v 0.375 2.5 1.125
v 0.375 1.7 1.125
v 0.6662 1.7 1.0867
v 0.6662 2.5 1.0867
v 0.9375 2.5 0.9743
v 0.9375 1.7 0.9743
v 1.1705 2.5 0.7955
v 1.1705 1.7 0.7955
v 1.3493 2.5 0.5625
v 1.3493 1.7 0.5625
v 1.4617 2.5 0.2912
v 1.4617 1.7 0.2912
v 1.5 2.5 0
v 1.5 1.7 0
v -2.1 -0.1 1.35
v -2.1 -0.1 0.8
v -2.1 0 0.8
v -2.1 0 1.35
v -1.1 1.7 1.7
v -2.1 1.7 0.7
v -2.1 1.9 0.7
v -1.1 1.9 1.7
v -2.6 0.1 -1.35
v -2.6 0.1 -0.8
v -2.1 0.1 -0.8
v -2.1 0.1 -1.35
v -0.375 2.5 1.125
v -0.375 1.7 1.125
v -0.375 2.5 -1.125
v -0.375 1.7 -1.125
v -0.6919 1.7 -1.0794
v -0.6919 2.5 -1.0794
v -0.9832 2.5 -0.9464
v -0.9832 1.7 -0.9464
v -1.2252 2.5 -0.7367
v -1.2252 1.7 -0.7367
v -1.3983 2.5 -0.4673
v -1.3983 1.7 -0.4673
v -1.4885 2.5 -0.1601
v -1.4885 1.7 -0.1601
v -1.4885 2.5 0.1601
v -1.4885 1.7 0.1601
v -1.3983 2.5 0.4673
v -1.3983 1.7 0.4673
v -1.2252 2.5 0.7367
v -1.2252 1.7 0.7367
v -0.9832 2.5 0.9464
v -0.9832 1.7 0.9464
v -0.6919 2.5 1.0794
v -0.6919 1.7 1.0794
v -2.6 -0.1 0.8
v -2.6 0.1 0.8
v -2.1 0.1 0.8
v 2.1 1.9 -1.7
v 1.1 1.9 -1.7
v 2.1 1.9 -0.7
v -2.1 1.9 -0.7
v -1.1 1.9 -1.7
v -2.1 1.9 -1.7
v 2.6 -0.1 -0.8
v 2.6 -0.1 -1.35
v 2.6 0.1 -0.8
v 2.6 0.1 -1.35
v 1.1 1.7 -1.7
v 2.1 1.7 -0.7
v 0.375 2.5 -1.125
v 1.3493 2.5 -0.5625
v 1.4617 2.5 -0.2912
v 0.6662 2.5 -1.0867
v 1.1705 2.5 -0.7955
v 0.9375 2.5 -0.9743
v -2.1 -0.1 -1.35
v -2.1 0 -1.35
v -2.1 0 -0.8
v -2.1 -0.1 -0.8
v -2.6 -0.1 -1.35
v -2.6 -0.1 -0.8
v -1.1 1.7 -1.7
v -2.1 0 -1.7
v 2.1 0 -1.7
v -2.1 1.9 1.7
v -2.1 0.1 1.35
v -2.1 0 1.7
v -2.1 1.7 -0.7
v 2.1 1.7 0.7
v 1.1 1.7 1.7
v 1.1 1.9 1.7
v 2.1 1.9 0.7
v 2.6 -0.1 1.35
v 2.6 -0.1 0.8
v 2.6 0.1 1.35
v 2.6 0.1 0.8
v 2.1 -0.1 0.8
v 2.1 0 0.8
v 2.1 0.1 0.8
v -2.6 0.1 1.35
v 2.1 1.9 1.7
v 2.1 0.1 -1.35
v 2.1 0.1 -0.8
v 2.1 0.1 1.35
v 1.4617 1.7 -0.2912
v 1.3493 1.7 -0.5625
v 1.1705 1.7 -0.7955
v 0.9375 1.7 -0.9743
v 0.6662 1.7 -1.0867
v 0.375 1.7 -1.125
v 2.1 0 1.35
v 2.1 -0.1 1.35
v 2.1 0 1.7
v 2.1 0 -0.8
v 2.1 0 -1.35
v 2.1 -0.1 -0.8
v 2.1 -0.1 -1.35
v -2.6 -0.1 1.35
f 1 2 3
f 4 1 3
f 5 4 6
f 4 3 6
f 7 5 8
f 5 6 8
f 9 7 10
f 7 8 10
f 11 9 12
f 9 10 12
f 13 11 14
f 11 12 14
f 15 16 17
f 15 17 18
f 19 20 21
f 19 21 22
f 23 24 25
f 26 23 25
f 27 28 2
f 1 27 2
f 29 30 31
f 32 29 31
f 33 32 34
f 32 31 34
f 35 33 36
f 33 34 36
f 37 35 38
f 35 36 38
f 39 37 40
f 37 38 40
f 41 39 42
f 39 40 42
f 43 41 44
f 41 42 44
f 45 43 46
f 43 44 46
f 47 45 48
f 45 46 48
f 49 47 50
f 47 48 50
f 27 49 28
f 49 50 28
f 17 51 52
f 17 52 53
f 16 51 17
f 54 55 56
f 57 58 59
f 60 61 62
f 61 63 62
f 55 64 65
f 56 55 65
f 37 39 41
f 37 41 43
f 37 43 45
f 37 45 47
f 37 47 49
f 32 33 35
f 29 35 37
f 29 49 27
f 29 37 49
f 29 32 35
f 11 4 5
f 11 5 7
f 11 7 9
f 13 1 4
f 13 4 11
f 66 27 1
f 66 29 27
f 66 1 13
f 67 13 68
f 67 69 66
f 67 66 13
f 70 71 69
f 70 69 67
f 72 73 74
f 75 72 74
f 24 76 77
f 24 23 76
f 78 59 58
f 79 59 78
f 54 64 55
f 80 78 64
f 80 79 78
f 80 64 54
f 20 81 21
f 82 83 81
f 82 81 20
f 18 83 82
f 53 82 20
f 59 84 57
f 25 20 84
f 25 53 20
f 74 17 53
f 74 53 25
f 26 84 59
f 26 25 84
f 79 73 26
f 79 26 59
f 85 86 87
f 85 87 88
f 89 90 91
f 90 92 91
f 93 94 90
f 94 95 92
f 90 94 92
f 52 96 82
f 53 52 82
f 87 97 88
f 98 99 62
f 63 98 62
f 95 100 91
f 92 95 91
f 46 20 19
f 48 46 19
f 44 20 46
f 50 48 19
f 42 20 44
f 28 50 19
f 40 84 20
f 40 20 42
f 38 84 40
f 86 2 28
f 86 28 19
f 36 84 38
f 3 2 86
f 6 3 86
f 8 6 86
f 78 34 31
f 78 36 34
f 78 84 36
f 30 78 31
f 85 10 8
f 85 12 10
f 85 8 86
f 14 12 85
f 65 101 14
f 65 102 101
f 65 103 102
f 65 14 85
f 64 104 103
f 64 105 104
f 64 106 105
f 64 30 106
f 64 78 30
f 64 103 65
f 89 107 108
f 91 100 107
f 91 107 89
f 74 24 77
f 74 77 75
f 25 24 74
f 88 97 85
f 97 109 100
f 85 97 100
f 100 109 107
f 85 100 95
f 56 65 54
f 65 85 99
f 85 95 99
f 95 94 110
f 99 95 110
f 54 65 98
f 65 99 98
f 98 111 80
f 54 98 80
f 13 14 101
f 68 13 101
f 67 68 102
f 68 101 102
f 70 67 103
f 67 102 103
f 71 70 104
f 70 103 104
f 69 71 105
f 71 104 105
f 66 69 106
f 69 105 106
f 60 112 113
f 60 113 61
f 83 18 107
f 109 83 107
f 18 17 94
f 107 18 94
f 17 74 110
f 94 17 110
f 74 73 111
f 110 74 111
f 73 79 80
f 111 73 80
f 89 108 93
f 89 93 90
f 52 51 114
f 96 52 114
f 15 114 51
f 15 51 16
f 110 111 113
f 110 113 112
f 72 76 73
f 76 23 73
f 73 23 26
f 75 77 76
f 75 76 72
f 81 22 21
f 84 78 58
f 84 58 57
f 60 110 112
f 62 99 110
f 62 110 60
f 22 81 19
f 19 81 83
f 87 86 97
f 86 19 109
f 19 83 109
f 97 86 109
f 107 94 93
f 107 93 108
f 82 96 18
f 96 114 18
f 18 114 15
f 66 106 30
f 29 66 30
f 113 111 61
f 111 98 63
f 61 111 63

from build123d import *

# Parameters (mm, degrees)
SKETCH1_W           = 4.2
SKETCH1_H           = 3.4
BOSS_EXTRUDE1_DEPTH = 1.7
SKETCH2_W           = 0.5
SKETCH2_H           = 0.55
BOSS_EXTRUDE2_DEPTH = 0.1
BOSS_EXTRUDE3_DEPTH = 0.2
BOSS_EXTRUDE4_DEPTH = 0.8


with BuildPart() as part:
    # Sketch1 → Boss-Extrude1 (new body)
    with BuildSketch(Plane(origin=(0, 0, 0), x_dir=(1, 0, 0), z_dir=(0, 1, 0))):
        Rectangle(SKETCH1_W, SKETCH1_H)
    extrude(amount=BOSS_EXTRUDE1_DEPTH)

    # Sketch2 → Boss-Extrude2 (add, symmetric)
    with BuildSketch(Plane.XZ):
        with Locations((2.35, 1.075)):
            Rectangle(SKETCH2_W, SKETCH2_H)
        with Locations((2.35, -1.075)):
            Rectangle(SKETCH2_W, SKETCH2_H)
        with Locations((-2.35, -1.075)):
            Rectangle(SKETCH2_W, SKETCH2_H)
        with Locations((-2.35, 1.075)):
            Rectangle(SKETCH2_W, SKETCH2_H)
    extrude(amount=BOSS_EXTRUDE2_DEPTH, both=True)

    # Sketch3 → Boss-Extrude3 (add)
    with BuildSketch(Plane(origin=(0, 1.7, 0), x_dir=(1, 0, 0), z_dir=(0, 1, 0))):
        Polygon((-2.1, 1.7), (-1.1, 1.7), (-2.1, 0.7), align=None)
        Polygon((1.1, 1.7), (2.1, 0.7), (2.1, 1.7), align=None)
        Polygon((-2.1, -0.7), (-1.1, -1.7), (-2.1, -1.7), align=None)
        Polygon((1.1, -1.7), (2.1, -0.7), (2.1, -1.7), align=None)
    extrude(amount=BOSS_EXTRUDE3_DEPTH)

    # Sketch4 → Boss-Extrude4 (add)
    with BuildSketch(Plane(origin=(0, 1.7, 0), x_dir=(1, 0, 0), z_dir=(0, 1, 0))):
        with BuildLine():
            Line((0.375, 1.125), (-0.375, 1.125))
            ThreePointArc((-0.375, 1.125), (-0.184760274, 1.10879838), (0, 1.060660172))
            ThreePointArc((0, 1.060660172), (0.184760274, 1.10879838), (0.375, 1.125))
        make_face()
        with BuildLine():
            ThreePointArc((0, -1.060660172), (-0.184760274, -1.10879838), (-0.375, -1.125))
            Line((-0.375, -1.125), (0.375, -1.125))
            ThreePointArc((0.375, -1.125), (0.184760274, -1.10879838), (0, -1.060660172))
        make_face()
        with BuildLine():
            ThreePointArc((0, 1.060660172), (-0.198360449, 0.967927061), (-0.375, 0.838525492))
            Line((-0.375, 0.838525492), (-0.375, -0.838525492))
            ThreePointArc((-0.375, -0.838525492), (-0.198360449, -0.967927061), (0, -1.060660172))
            ThreePointArc((0, -1.060660172), (0.198360449, -0.967927061), (0.375, -0.838525492))
            Line((0.375, -0.838525492), (0.375, 0.838525492))
            ThreePointArc((0.375, 0.838525492), (0.198360449, 0.967927061), (0, 1.060660172))
        make_face()
        with BuildLine():
            ThreePointArc((1.5, 0), (1.170495129, 0.795495129), (0.375, 1.125))
            Line((0.375, 1.125), (0.375, 0.838525492))
            ThreePointArc((0.375, 0.838525492), (0.651979795, 0.459279327), (0.75, 0))
            ThreePointArc((0.75, 0), (0.651979795, -0.459279327), (0.375, -0.838525492))
            Line((0.375, -0.838525492), (0.375, -1.125))
            ThreePointArc((0.375, -1.125), (1.170495129, -0.795495129), (1.5, 0))
        make_face()
        with BuildLine():
            Line((0.375, 0.838525492), (0.375, 1.125))
            ThreePointArc((0.375, 1.125), (0.184760274, 1.10879838), (0, 1.060660172))
            ThreePointArc((0, 1.060660172), (0.198360449, 0.967927061), (0.375, 0.838525492))
        make_face()
        with BuildLine():
            ThreePointArc((0, -1.060660172), (0.184760274, -1.10879838), (0.375, -1.125))
            Line((0.375, -1.125), (0.375, -0.838525492))
            ThreePointArc((0.375, -0.838525492), (0.198360449, -0.967927061), (0, -1.060660172))
        make_face()
        with BuildLine():
            ThreePointArc((0, 1.060660172), (-0.184760274, 1.10879838), (-0.375, 1.125))
            Line((-0.375, 1.125), (-0.375, 0.838525492))
            ThreePointArc((-0.375, 0.838525492), (-0.198360449, 0.967927061), (0, 1.060660172))
        make_face()
        with BuildLine():
            Line((-0.375, 0.838525492), (-0.375, 1.125))
            ThreePointArc((-0.375, 1.125), (-1.5, 0), (-0.375, -1.125))
            Line((-0.375, -1.125), (-0.375, -0.838525492))
            ThreePointArc((-0.375, -0.838525492), (-0.75, 0), (-0.375, 0.838525492))
        make_face()
        with BuildLine():
            Line((-0.375, -0.838525492), (-0.375, -1.125))
            ThreePointArc((-0.375, -1.125), (-0.184760274, -1.10879838), (0, -1.060660172))
            ThreePointArc((0, -1.060660172), (-0.198360449, -0.967927061), (-0.375, -0.838525492))
        make_face()
        with BuildLine():
            ThreePointArc((0.75, 0), (0.651979795, 0.459279327), (0.375, 0.838525492))
            Line((0.375, 0.838525492), (0.375, -0.838525492))
            ThreePointArc((0.375, -0.838525492), (0.651979795, -0.459279327), (0.75, 0))
        make_face()
        with BuildLine():
            Line((-0.375, -0.838525492), (-0.375, 0.838525492))
            ThreePointArc((-0.375, 0.838525492), (-0.75, 0), (-0.375, -0.838525492))
        make_face()
    extrude(amount=BOSS_EXTRUDE4_DEPTH)


solid = part.part
